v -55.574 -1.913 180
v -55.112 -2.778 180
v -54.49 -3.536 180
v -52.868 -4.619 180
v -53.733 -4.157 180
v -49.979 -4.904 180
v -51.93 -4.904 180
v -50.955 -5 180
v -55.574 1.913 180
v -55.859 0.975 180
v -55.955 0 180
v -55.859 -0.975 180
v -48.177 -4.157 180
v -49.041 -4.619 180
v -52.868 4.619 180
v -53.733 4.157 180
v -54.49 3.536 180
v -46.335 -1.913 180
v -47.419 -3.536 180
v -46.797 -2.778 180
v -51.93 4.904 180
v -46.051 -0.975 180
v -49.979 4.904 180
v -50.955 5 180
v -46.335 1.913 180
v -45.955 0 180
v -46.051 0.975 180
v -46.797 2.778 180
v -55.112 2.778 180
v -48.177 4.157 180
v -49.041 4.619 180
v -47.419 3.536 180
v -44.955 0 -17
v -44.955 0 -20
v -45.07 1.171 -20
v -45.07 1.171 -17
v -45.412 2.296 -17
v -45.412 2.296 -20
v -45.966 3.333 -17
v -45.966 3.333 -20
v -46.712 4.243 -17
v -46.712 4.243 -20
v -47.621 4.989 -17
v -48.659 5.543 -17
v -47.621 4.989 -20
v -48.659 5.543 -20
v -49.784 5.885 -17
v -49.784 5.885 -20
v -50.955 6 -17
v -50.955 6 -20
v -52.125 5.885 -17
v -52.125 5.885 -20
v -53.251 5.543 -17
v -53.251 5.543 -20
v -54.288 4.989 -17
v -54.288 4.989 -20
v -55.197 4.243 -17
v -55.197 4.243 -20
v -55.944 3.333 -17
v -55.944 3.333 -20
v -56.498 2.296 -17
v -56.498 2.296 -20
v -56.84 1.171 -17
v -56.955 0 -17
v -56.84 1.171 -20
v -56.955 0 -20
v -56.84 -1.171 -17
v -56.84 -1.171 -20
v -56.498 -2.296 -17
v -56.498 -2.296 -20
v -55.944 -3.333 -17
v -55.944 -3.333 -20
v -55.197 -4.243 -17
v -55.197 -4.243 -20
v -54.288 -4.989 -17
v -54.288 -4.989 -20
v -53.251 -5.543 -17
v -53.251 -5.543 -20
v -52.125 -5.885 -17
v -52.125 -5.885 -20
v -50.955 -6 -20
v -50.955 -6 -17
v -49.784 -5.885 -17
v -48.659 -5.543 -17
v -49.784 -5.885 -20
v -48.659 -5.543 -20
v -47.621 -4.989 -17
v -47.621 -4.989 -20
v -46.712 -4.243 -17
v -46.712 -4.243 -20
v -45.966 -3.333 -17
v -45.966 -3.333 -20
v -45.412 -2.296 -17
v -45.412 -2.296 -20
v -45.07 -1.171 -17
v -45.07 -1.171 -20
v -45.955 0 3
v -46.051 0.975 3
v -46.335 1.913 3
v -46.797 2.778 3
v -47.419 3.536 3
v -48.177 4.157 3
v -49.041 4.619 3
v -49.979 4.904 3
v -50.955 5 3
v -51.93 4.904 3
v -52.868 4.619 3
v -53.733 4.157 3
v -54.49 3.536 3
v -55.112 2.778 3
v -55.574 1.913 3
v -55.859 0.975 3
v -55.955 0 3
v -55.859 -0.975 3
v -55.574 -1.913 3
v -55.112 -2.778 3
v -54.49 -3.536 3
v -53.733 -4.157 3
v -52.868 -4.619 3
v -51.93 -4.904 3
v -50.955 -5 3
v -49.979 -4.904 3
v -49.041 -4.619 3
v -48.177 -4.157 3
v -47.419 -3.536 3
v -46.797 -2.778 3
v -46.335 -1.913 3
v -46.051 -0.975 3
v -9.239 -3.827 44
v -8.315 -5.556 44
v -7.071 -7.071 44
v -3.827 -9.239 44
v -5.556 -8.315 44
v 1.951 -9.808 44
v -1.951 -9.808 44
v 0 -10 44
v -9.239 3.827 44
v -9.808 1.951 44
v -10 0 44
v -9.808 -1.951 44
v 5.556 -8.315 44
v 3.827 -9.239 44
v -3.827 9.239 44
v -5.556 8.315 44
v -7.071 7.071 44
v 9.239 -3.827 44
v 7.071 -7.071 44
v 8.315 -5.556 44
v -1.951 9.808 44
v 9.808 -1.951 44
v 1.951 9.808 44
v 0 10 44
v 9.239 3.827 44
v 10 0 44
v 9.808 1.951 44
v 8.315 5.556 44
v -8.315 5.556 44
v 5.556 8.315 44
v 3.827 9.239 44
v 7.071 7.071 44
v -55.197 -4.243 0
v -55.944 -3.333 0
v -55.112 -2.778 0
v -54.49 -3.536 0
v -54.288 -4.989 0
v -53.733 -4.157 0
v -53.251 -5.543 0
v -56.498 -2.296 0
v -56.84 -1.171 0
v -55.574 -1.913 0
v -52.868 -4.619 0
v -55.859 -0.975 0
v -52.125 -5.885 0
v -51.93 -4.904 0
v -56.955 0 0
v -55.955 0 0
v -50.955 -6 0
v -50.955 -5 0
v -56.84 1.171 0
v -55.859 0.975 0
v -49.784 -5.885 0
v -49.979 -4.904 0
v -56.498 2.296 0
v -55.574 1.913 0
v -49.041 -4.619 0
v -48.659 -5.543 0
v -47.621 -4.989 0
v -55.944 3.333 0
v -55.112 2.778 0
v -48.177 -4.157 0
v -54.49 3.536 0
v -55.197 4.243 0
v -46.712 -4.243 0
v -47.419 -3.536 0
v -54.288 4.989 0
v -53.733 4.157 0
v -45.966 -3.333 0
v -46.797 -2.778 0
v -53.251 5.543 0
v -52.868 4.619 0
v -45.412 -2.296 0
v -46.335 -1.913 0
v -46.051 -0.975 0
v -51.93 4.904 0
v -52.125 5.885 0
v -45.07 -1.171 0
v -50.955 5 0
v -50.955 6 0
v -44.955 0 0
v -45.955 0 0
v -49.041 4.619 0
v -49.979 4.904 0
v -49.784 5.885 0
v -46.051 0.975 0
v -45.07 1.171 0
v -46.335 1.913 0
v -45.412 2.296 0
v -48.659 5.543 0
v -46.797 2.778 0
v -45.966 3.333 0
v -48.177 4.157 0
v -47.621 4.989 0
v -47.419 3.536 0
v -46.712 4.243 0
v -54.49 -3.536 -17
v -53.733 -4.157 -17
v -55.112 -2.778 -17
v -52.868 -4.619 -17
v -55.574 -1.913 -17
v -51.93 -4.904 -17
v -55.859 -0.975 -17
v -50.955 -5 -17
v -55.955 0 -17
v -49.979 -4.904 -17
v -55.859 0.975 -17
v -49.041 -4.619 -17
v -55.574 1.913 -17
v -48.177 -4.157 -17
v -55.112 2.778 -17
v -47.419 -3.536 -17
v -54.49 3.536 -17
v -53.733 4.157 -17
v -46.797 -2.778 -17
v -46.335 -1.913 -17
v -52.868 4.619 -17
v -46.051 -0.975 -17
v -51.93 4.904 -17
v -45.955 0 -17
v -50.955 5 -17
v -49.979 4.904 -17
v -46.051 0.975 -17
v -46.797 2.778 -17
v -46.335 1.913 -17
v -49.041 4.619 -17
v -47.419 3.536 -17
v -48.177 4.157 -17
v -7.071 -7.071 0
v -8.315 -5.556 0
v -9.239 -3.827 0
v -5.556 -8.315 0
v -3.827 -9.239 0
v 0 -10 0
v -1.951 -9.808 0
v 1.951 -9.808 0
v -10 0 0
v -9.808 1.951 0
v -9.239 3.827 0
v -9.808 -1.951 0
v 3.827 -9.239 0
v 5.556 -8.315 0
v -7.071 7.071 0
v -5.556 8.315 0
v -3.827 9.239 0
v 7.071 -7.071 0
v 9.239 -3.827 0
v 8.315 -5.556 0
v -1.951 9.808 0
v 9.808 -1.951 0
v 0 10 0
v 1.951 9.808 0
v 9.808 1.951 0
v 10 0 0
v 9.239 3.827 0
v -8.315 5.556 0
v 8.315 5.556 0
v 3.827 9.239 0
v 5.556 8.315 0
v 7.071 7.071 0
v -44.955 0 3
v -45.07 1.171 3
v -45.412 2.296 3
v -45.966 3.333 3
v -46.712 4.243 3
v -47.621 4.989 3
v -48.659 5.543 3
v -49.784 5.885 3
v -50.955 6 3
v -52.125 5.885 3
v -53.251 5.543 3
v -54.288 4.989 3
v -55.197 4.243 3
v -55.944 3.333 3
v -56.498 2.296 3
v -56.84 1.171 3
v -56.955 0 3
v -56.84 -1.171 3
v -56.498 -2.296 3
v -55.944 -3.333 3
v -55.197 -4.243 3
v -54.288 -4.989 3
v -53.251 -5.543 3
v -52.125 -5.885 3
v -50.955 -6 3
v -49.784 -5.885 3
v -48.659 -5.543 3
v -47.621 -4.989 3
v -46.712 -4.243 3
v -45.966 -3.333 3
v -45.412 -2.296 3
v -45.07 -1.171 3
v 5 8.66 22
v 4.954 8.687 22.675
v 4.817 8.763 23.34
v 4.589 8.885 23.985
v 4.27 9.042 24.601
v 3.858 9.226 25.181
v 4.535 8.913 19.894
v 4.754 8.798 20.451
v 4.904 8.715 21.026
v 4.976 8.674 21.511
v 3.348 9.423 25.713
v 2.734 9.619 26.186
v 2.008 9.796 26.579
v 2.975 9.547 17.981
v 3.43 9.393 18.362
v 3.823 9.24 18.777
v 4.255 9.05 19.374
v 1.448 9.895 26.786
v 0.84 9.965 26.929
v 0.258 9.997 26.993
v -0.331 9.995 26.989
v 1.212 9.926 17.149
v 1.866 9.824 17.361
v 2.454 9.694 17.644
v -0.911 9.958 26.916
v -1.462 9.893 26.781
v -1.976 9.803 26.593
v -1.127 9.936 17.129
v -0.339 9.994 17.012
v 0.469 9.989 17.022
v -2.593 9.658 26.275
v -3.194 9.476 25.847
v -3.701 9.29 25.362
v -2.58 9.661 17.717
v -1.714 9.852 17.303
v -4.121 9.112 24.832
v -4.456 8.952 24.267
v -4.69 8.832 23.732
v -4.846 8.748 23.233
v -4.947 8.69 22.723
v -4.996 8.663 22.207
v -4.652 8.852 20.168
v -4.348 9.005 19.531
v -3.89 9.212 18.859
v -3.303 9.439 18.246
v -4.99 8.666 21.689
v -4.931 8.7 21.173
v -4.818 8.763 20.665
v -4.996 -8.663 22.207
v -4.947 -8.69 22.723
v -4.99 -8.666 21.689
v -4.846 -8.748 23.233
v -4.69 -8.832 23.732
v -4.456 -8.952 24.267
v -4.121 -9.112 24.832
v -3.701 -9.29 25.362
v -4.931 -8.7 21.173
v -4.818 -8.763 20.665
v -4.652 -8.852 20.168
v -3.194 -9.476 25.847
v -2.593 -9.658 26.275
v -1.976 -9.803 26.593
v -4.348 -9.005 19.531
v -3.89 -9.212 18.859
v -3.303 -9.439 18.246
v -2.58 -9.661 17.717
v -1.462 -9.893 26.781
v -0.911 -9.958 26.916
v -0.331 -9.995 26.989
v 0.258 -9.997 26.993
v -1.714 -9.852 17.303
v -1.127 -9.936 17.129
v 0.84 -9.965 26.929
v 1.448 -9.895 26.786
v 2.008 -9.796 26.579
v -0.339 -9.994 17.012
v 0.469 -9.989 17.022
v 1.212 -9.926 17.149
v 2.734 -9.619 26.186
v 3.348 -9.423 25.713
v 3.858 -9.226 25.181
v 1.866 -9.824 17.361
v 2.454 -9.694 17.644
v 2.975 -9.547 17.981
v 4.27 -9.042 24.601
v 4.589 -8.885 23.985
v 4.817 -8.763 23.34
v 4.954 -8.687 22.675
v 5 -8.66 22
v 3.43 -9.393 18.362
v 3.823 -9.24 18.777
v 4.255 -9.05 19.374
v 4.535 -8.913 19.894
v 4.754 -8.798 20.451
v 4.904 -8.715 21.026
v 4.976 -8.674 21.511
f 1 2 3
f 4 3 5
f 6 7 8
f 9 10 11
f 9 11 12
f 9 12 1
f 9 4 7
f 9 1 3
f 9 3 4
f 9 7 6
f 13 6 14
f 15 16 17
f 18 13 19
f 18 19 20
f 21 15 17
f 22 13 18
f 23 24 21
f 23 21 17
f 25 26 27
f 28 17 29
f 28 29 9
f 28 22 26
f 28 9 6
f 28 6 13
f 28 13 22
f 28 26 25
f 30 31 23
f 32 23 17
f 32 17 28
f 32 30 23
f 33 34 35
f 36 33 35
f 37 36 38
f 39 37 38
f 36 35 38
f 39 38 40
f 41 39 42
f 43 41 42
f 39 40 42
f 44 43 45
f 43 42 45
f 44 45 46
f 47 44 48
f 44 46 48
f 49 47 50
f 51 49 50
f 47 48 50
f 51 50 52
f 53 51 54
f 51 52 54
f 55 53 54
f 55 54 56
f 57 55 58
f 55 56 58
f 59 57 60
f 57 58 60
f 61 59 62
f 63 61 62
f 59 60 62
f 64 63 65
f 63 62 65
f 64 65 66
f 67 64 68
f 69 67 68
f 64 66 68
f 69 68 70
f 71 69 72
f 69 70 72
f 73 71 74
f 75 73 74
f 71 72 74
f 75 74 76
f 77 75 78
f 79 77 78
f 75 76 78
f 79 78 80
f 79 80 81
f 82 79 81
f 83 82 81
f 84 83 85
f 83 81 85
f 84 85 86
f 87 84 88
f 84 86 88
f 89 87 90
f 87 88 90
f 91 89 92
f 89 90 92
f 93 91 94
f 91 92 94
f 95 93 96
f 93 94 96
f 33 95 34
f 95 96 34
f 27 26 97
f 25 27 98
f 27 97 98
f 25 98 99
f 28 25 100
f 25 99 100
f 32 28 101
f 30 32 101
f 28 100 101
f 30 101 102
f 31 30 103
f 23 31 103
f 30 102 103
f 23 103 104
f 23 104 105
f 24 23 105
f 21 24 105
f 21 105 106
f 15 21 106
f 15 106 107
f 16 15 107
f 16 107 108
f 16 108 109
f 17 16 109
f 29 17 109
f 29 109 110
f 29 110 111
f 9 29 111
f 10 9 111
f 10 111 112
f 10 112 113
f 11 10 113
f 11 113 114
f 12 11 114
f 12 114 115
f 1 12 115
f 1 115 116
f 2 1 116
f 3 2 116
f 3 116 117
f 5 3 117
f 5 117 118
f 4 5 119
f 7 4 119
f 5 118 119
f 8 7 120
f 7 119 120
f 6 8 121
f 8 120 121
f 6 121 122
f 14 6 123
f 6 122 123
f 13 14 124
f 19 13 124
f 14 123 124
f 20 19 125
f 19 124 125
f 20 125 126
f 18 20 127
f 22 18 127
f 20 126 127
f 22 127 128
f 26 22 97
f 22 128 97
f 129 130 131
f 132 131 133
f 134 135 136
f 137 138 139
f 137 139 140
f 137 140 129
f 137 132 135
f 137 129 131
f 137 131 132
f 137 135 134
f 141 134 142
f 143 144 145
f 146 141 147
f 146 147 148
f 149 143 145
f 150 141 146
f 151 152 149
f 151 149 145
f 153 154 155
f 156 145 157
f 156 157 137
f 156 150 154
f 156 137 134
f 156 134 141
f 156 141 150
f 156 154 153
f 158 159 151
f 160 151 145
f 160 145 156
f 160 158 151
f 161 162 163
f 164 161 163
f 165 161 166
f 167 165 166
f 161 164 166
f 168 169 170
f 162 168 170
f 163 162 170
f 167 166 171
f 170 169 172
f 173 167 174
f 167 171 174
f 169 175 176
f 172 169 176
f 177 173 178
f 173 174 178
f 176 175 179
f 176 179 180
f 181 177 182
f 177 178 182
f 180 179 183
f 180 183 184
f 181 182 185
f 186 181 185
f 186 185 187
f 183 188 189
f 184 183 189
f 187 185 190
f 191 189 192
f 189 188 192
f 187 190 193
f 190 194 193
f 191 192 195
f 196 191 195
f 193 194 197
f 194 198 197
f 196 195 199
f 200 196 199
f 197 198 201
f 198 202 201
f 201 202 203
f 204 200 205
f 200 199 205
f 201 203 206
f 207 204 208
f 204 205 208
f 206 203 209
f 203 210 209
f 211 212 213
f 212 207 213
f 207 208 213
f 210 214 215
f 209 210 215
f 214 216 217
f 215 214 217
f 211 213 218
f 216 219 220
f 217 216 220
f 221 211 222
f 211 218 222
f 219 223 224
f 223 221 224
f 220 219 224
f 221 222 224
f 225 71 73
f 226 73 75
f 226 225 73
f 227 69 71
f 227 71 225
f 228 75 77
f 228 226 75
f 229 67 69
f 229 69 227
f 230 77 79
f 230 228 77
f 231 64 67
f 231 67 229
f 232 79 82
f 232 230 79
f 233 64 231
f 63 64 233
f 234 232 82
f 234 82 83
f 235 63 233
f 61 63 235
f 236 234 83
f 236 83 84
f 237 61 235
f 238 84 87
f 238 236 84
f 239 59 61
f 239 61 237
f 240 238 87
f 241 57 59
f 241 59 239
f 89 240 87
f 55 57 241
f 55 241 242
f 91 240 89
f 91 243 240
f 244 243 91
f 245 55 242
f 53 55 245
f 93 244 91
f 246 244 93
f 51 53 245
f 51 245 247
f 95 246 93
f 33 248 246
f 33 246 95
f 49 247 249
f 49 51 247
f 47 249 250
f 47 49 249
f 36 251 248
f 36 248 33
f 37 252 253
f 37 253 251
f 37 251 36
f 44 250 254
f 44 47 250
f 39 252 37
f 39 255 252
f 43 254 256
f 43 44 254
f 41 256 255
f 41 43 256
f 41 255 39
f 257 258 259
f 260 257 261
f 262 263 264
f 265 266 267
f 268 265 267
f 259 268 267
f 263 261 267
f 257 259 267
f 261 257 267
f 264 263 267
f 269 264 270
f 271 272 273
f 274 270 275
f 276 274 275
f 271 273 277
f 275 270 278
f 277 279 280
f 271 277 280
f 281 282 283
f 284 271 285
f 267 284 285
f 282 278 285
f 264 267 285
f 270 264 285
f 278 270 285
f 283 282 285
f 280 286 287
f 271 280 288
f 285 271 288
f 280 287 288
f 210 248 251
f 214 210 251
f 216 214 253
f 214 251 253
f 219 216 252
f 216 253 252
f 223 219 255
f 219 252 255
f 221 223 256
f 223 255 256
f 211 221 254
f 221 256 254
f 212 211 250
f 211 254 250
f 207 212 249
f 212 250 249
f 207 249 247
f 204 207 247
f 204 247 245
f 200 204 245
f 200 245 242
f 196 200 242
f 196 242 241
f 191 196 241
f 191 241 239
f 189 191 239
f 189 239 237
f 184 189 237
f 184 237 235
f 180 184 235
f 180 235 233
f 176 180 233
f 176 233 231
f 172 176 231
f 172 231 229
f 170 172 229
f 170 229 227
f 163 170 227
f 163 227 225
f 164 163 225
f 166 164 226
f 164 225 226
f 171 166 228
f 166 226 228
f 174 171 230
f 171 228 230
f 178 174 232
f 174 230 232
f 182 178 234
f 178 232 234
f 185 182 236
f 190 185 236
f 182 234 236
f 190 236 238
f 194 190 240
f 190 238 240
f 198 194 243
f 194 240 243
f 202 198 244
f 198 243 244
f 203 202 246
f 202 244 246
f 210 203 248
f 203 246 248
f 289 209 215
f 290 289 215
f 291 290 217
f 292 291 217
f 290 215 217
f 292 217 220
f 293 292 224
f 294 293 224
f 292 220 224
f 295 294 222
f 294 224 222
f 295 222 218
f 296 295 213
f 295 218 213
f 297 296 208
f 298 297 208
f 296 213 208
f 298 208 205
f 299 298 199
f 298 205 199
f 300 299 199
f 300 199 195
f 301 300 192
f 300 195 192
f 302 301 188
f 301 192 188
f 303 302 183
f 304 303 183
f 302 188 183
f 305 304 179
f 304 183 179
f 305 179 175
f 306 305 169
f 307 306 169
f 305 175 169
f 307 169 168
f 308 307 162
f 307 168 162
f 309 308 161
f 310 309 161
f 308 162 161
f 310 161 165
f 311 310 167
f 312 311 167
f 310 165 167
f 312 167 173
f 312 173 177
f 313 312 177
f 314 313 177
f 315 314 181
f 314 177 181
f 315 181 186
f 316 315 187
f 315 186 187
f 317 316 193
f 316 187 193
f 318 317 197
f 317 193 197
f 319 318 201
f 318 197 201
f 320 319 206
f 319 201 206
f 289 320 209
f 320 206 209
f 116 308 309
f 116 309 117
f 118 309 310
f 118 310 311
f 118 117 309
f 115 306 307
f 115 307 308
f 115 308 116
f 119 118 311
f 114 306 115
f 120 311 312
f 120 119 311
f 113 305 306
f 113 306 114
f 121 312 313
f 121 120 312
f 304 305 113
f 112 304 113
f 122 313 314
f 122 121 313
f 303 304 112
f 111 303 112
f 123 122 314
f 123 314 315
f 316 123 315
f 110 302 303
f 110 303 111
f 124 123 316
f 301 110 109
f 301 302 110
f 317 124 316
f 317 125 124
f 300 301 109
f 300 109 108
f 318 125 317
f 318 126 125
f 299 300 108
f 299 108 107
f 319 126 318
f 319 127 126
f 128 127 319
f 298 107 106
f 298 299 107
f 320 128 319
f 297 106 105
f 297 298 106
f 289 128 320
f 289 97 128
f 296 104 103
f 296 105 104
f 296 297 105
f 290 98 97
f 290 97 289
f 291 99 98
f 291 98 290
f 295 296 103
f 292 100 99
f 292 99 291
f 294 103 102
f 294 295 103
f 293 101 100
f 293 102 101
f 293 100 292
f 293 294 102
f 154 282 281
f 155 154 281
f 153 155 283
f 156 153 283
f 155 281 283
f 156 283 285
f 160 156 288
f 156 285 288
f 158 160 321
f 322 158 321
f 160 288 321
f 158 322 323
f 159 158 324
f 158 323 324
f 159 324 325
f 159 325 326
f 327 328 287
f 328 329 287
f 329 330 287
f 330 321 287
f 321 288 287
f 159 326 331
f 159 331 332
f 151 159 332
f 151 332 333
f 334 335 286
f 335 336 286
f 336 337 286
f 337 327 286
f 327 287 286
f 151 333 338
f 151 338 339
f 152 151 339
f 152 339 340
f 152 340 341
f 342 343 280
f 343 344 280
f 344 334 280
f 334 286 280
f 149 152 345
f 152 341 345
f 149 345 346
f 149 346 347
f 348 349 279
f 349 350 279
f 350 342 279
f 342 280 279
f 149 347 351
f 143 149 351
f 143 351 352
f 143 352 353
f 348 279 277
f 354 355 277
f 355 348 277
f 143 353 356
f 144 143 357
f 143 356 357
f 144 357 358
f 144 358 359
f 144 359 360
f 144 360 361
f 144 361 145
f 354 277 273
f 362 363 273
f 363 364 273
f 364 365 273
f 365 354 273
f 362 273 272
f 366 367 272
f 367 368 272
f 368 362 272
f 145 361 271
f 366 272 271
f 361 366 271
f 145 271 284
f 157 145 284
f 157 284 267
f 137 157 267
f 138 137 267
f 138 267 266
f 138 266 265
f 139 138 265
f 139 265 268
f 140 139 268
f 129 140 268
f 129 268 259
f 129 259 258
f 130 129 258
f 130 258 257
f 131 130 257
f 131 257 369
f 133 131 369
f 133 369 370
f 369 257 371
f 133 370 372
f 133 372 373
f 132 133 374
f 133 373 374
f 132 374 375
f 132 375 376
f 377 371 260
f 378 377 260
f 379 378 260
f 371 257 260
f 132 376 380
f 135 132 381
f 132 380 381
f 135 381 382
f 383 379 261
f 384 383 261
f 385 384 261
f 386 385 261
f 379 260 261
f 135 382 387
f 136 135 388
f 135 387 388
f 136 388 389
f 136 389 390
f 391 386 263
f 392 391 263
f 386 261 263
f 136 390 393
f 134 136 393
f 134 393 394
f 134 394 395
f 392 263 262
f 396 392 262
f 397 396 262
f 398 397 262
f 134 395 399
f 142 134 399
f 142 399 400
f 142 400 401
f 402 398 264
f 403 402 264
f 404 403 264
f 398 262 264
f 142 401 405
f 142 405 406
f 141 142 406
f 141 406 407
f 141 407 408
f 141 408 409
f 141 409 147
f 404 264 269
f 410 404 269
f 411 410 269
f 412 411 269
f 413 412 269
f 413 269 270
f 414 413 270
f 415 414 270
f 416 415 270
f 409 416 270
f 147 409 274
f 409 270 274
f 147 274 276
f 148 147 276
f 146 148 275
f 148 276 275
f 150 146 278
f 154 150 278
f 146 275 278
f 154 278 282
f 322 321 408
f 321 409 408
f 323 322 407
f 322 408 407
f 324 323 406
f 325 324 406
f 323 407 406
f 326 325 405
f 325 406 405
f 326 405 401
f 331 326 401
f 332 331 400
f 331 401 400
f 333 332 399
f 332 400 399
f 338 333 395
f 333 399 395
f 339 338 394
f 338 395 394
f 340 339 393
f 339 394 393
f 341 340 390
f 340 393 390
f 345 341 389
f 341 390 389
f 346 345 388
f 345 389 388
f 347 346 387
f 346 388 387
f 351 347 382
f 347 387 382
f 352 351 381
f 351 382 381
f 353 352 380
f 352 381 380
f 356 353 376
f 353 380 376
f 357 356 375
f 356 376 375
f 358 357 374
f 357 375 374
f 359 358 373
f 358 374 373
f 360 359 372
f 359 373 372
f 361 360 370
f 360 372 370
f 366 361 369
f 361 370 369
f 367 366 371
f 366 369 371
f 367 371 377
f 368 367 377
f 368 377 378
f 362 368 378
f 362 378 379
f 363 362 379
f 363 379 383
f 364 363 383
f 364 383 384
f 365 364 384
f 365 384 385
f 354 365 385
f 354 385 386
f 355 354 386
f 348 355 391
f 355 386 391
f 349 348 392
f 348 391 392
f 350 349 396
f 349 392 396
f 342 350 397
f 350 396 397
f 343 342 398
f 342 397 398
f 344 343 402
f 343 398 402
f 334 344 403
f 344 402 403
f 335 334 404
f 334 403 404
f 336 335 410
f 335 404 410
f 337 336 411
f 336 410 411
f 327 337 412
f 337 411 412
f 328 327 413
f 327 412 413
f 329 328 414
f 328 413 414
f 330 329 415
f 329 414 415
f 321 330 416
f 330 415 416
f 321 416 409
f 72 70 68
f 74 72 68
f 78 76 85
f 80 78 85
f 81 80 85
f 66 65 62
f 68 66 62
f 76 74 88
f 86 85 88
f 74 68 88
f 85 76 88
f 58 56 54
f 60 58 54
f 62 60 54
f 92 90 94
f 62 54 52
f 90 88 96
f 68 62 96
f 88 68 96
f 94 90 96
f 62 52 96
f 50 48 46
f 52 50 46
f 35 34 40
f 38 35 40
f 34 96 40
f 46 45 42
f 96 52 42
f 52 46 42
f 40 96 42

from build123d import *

# Parameters (mm, degrees)
F0_R          = 10
F1_DEPTH      = 44
F2_R          = 5
F3_DEPTH      = 25
F3_DEPTH_BACK = 21.05684
F4_R          = 6
F4_R_2        = 5
F5_DEPTH      = 3
F6_DEPTH      = 200
F8_DEPTH      = 3


with BuildPart() as f1:
    # F0 (on Top) → F1 (new body)
    with BuildSketch(Plane.XY):
        Circle(F0_R)
    extrude(amount=F1_DEPTH)

    # F2 (on Front) → F3 (cut, two sides)
    with BuildSketch(Plane.XZ) as f3_sk:
        with Locations((0, 22)):
            Circle(F2_R)
    extrude(amount=-F3_DEPTH, mode=Mode.SUBTRACT)
    extrude(f3_sk.sketch, amount=F3_DEPTH_BACK, mode=Mode.SUBTRACT)


with BuildPart() as f5:
    # F4 (on Top) → F5 (new body)
    with BuildSketch(Plane.XY):
        with Locations((-50.9548272629, 0)):
            Circle(F4_R)
        with Locations((-50.9548272629, 0)):
            Circle(F4_R_2, mode=Mode.SUBTRACT)
        with Locations((-50.9548272629, 0)):
            Circle(F4_R_2)
    extrude(amount=F5_DEPTH)

    # F4 (on Top) → F6 (join)
    with BuildSketch(Plane.XY):
        with Locations((-50.9548272629, 0)):
            Circle(F4_R_2)
    extrude(amount=F6_DEPTH)


with BuildPart() as f5_1:
    # F7: moved
    add(f5.part.moved(Location((0, 0, -20))))

    # F4 (on Top) → F8 (join)
    with BuildSketch(Plane.XY):
        with Locations((-50.9548272629, 0)):
            Circle(F4_R)
        with Locations((-50.9548272629, 0)):
            Circle(F4_R_2, mode=Mode.SUBTRACT)
    extrude(amount=F8_DEPTH)


solid = Compound([f1.part, f5_1.part])
